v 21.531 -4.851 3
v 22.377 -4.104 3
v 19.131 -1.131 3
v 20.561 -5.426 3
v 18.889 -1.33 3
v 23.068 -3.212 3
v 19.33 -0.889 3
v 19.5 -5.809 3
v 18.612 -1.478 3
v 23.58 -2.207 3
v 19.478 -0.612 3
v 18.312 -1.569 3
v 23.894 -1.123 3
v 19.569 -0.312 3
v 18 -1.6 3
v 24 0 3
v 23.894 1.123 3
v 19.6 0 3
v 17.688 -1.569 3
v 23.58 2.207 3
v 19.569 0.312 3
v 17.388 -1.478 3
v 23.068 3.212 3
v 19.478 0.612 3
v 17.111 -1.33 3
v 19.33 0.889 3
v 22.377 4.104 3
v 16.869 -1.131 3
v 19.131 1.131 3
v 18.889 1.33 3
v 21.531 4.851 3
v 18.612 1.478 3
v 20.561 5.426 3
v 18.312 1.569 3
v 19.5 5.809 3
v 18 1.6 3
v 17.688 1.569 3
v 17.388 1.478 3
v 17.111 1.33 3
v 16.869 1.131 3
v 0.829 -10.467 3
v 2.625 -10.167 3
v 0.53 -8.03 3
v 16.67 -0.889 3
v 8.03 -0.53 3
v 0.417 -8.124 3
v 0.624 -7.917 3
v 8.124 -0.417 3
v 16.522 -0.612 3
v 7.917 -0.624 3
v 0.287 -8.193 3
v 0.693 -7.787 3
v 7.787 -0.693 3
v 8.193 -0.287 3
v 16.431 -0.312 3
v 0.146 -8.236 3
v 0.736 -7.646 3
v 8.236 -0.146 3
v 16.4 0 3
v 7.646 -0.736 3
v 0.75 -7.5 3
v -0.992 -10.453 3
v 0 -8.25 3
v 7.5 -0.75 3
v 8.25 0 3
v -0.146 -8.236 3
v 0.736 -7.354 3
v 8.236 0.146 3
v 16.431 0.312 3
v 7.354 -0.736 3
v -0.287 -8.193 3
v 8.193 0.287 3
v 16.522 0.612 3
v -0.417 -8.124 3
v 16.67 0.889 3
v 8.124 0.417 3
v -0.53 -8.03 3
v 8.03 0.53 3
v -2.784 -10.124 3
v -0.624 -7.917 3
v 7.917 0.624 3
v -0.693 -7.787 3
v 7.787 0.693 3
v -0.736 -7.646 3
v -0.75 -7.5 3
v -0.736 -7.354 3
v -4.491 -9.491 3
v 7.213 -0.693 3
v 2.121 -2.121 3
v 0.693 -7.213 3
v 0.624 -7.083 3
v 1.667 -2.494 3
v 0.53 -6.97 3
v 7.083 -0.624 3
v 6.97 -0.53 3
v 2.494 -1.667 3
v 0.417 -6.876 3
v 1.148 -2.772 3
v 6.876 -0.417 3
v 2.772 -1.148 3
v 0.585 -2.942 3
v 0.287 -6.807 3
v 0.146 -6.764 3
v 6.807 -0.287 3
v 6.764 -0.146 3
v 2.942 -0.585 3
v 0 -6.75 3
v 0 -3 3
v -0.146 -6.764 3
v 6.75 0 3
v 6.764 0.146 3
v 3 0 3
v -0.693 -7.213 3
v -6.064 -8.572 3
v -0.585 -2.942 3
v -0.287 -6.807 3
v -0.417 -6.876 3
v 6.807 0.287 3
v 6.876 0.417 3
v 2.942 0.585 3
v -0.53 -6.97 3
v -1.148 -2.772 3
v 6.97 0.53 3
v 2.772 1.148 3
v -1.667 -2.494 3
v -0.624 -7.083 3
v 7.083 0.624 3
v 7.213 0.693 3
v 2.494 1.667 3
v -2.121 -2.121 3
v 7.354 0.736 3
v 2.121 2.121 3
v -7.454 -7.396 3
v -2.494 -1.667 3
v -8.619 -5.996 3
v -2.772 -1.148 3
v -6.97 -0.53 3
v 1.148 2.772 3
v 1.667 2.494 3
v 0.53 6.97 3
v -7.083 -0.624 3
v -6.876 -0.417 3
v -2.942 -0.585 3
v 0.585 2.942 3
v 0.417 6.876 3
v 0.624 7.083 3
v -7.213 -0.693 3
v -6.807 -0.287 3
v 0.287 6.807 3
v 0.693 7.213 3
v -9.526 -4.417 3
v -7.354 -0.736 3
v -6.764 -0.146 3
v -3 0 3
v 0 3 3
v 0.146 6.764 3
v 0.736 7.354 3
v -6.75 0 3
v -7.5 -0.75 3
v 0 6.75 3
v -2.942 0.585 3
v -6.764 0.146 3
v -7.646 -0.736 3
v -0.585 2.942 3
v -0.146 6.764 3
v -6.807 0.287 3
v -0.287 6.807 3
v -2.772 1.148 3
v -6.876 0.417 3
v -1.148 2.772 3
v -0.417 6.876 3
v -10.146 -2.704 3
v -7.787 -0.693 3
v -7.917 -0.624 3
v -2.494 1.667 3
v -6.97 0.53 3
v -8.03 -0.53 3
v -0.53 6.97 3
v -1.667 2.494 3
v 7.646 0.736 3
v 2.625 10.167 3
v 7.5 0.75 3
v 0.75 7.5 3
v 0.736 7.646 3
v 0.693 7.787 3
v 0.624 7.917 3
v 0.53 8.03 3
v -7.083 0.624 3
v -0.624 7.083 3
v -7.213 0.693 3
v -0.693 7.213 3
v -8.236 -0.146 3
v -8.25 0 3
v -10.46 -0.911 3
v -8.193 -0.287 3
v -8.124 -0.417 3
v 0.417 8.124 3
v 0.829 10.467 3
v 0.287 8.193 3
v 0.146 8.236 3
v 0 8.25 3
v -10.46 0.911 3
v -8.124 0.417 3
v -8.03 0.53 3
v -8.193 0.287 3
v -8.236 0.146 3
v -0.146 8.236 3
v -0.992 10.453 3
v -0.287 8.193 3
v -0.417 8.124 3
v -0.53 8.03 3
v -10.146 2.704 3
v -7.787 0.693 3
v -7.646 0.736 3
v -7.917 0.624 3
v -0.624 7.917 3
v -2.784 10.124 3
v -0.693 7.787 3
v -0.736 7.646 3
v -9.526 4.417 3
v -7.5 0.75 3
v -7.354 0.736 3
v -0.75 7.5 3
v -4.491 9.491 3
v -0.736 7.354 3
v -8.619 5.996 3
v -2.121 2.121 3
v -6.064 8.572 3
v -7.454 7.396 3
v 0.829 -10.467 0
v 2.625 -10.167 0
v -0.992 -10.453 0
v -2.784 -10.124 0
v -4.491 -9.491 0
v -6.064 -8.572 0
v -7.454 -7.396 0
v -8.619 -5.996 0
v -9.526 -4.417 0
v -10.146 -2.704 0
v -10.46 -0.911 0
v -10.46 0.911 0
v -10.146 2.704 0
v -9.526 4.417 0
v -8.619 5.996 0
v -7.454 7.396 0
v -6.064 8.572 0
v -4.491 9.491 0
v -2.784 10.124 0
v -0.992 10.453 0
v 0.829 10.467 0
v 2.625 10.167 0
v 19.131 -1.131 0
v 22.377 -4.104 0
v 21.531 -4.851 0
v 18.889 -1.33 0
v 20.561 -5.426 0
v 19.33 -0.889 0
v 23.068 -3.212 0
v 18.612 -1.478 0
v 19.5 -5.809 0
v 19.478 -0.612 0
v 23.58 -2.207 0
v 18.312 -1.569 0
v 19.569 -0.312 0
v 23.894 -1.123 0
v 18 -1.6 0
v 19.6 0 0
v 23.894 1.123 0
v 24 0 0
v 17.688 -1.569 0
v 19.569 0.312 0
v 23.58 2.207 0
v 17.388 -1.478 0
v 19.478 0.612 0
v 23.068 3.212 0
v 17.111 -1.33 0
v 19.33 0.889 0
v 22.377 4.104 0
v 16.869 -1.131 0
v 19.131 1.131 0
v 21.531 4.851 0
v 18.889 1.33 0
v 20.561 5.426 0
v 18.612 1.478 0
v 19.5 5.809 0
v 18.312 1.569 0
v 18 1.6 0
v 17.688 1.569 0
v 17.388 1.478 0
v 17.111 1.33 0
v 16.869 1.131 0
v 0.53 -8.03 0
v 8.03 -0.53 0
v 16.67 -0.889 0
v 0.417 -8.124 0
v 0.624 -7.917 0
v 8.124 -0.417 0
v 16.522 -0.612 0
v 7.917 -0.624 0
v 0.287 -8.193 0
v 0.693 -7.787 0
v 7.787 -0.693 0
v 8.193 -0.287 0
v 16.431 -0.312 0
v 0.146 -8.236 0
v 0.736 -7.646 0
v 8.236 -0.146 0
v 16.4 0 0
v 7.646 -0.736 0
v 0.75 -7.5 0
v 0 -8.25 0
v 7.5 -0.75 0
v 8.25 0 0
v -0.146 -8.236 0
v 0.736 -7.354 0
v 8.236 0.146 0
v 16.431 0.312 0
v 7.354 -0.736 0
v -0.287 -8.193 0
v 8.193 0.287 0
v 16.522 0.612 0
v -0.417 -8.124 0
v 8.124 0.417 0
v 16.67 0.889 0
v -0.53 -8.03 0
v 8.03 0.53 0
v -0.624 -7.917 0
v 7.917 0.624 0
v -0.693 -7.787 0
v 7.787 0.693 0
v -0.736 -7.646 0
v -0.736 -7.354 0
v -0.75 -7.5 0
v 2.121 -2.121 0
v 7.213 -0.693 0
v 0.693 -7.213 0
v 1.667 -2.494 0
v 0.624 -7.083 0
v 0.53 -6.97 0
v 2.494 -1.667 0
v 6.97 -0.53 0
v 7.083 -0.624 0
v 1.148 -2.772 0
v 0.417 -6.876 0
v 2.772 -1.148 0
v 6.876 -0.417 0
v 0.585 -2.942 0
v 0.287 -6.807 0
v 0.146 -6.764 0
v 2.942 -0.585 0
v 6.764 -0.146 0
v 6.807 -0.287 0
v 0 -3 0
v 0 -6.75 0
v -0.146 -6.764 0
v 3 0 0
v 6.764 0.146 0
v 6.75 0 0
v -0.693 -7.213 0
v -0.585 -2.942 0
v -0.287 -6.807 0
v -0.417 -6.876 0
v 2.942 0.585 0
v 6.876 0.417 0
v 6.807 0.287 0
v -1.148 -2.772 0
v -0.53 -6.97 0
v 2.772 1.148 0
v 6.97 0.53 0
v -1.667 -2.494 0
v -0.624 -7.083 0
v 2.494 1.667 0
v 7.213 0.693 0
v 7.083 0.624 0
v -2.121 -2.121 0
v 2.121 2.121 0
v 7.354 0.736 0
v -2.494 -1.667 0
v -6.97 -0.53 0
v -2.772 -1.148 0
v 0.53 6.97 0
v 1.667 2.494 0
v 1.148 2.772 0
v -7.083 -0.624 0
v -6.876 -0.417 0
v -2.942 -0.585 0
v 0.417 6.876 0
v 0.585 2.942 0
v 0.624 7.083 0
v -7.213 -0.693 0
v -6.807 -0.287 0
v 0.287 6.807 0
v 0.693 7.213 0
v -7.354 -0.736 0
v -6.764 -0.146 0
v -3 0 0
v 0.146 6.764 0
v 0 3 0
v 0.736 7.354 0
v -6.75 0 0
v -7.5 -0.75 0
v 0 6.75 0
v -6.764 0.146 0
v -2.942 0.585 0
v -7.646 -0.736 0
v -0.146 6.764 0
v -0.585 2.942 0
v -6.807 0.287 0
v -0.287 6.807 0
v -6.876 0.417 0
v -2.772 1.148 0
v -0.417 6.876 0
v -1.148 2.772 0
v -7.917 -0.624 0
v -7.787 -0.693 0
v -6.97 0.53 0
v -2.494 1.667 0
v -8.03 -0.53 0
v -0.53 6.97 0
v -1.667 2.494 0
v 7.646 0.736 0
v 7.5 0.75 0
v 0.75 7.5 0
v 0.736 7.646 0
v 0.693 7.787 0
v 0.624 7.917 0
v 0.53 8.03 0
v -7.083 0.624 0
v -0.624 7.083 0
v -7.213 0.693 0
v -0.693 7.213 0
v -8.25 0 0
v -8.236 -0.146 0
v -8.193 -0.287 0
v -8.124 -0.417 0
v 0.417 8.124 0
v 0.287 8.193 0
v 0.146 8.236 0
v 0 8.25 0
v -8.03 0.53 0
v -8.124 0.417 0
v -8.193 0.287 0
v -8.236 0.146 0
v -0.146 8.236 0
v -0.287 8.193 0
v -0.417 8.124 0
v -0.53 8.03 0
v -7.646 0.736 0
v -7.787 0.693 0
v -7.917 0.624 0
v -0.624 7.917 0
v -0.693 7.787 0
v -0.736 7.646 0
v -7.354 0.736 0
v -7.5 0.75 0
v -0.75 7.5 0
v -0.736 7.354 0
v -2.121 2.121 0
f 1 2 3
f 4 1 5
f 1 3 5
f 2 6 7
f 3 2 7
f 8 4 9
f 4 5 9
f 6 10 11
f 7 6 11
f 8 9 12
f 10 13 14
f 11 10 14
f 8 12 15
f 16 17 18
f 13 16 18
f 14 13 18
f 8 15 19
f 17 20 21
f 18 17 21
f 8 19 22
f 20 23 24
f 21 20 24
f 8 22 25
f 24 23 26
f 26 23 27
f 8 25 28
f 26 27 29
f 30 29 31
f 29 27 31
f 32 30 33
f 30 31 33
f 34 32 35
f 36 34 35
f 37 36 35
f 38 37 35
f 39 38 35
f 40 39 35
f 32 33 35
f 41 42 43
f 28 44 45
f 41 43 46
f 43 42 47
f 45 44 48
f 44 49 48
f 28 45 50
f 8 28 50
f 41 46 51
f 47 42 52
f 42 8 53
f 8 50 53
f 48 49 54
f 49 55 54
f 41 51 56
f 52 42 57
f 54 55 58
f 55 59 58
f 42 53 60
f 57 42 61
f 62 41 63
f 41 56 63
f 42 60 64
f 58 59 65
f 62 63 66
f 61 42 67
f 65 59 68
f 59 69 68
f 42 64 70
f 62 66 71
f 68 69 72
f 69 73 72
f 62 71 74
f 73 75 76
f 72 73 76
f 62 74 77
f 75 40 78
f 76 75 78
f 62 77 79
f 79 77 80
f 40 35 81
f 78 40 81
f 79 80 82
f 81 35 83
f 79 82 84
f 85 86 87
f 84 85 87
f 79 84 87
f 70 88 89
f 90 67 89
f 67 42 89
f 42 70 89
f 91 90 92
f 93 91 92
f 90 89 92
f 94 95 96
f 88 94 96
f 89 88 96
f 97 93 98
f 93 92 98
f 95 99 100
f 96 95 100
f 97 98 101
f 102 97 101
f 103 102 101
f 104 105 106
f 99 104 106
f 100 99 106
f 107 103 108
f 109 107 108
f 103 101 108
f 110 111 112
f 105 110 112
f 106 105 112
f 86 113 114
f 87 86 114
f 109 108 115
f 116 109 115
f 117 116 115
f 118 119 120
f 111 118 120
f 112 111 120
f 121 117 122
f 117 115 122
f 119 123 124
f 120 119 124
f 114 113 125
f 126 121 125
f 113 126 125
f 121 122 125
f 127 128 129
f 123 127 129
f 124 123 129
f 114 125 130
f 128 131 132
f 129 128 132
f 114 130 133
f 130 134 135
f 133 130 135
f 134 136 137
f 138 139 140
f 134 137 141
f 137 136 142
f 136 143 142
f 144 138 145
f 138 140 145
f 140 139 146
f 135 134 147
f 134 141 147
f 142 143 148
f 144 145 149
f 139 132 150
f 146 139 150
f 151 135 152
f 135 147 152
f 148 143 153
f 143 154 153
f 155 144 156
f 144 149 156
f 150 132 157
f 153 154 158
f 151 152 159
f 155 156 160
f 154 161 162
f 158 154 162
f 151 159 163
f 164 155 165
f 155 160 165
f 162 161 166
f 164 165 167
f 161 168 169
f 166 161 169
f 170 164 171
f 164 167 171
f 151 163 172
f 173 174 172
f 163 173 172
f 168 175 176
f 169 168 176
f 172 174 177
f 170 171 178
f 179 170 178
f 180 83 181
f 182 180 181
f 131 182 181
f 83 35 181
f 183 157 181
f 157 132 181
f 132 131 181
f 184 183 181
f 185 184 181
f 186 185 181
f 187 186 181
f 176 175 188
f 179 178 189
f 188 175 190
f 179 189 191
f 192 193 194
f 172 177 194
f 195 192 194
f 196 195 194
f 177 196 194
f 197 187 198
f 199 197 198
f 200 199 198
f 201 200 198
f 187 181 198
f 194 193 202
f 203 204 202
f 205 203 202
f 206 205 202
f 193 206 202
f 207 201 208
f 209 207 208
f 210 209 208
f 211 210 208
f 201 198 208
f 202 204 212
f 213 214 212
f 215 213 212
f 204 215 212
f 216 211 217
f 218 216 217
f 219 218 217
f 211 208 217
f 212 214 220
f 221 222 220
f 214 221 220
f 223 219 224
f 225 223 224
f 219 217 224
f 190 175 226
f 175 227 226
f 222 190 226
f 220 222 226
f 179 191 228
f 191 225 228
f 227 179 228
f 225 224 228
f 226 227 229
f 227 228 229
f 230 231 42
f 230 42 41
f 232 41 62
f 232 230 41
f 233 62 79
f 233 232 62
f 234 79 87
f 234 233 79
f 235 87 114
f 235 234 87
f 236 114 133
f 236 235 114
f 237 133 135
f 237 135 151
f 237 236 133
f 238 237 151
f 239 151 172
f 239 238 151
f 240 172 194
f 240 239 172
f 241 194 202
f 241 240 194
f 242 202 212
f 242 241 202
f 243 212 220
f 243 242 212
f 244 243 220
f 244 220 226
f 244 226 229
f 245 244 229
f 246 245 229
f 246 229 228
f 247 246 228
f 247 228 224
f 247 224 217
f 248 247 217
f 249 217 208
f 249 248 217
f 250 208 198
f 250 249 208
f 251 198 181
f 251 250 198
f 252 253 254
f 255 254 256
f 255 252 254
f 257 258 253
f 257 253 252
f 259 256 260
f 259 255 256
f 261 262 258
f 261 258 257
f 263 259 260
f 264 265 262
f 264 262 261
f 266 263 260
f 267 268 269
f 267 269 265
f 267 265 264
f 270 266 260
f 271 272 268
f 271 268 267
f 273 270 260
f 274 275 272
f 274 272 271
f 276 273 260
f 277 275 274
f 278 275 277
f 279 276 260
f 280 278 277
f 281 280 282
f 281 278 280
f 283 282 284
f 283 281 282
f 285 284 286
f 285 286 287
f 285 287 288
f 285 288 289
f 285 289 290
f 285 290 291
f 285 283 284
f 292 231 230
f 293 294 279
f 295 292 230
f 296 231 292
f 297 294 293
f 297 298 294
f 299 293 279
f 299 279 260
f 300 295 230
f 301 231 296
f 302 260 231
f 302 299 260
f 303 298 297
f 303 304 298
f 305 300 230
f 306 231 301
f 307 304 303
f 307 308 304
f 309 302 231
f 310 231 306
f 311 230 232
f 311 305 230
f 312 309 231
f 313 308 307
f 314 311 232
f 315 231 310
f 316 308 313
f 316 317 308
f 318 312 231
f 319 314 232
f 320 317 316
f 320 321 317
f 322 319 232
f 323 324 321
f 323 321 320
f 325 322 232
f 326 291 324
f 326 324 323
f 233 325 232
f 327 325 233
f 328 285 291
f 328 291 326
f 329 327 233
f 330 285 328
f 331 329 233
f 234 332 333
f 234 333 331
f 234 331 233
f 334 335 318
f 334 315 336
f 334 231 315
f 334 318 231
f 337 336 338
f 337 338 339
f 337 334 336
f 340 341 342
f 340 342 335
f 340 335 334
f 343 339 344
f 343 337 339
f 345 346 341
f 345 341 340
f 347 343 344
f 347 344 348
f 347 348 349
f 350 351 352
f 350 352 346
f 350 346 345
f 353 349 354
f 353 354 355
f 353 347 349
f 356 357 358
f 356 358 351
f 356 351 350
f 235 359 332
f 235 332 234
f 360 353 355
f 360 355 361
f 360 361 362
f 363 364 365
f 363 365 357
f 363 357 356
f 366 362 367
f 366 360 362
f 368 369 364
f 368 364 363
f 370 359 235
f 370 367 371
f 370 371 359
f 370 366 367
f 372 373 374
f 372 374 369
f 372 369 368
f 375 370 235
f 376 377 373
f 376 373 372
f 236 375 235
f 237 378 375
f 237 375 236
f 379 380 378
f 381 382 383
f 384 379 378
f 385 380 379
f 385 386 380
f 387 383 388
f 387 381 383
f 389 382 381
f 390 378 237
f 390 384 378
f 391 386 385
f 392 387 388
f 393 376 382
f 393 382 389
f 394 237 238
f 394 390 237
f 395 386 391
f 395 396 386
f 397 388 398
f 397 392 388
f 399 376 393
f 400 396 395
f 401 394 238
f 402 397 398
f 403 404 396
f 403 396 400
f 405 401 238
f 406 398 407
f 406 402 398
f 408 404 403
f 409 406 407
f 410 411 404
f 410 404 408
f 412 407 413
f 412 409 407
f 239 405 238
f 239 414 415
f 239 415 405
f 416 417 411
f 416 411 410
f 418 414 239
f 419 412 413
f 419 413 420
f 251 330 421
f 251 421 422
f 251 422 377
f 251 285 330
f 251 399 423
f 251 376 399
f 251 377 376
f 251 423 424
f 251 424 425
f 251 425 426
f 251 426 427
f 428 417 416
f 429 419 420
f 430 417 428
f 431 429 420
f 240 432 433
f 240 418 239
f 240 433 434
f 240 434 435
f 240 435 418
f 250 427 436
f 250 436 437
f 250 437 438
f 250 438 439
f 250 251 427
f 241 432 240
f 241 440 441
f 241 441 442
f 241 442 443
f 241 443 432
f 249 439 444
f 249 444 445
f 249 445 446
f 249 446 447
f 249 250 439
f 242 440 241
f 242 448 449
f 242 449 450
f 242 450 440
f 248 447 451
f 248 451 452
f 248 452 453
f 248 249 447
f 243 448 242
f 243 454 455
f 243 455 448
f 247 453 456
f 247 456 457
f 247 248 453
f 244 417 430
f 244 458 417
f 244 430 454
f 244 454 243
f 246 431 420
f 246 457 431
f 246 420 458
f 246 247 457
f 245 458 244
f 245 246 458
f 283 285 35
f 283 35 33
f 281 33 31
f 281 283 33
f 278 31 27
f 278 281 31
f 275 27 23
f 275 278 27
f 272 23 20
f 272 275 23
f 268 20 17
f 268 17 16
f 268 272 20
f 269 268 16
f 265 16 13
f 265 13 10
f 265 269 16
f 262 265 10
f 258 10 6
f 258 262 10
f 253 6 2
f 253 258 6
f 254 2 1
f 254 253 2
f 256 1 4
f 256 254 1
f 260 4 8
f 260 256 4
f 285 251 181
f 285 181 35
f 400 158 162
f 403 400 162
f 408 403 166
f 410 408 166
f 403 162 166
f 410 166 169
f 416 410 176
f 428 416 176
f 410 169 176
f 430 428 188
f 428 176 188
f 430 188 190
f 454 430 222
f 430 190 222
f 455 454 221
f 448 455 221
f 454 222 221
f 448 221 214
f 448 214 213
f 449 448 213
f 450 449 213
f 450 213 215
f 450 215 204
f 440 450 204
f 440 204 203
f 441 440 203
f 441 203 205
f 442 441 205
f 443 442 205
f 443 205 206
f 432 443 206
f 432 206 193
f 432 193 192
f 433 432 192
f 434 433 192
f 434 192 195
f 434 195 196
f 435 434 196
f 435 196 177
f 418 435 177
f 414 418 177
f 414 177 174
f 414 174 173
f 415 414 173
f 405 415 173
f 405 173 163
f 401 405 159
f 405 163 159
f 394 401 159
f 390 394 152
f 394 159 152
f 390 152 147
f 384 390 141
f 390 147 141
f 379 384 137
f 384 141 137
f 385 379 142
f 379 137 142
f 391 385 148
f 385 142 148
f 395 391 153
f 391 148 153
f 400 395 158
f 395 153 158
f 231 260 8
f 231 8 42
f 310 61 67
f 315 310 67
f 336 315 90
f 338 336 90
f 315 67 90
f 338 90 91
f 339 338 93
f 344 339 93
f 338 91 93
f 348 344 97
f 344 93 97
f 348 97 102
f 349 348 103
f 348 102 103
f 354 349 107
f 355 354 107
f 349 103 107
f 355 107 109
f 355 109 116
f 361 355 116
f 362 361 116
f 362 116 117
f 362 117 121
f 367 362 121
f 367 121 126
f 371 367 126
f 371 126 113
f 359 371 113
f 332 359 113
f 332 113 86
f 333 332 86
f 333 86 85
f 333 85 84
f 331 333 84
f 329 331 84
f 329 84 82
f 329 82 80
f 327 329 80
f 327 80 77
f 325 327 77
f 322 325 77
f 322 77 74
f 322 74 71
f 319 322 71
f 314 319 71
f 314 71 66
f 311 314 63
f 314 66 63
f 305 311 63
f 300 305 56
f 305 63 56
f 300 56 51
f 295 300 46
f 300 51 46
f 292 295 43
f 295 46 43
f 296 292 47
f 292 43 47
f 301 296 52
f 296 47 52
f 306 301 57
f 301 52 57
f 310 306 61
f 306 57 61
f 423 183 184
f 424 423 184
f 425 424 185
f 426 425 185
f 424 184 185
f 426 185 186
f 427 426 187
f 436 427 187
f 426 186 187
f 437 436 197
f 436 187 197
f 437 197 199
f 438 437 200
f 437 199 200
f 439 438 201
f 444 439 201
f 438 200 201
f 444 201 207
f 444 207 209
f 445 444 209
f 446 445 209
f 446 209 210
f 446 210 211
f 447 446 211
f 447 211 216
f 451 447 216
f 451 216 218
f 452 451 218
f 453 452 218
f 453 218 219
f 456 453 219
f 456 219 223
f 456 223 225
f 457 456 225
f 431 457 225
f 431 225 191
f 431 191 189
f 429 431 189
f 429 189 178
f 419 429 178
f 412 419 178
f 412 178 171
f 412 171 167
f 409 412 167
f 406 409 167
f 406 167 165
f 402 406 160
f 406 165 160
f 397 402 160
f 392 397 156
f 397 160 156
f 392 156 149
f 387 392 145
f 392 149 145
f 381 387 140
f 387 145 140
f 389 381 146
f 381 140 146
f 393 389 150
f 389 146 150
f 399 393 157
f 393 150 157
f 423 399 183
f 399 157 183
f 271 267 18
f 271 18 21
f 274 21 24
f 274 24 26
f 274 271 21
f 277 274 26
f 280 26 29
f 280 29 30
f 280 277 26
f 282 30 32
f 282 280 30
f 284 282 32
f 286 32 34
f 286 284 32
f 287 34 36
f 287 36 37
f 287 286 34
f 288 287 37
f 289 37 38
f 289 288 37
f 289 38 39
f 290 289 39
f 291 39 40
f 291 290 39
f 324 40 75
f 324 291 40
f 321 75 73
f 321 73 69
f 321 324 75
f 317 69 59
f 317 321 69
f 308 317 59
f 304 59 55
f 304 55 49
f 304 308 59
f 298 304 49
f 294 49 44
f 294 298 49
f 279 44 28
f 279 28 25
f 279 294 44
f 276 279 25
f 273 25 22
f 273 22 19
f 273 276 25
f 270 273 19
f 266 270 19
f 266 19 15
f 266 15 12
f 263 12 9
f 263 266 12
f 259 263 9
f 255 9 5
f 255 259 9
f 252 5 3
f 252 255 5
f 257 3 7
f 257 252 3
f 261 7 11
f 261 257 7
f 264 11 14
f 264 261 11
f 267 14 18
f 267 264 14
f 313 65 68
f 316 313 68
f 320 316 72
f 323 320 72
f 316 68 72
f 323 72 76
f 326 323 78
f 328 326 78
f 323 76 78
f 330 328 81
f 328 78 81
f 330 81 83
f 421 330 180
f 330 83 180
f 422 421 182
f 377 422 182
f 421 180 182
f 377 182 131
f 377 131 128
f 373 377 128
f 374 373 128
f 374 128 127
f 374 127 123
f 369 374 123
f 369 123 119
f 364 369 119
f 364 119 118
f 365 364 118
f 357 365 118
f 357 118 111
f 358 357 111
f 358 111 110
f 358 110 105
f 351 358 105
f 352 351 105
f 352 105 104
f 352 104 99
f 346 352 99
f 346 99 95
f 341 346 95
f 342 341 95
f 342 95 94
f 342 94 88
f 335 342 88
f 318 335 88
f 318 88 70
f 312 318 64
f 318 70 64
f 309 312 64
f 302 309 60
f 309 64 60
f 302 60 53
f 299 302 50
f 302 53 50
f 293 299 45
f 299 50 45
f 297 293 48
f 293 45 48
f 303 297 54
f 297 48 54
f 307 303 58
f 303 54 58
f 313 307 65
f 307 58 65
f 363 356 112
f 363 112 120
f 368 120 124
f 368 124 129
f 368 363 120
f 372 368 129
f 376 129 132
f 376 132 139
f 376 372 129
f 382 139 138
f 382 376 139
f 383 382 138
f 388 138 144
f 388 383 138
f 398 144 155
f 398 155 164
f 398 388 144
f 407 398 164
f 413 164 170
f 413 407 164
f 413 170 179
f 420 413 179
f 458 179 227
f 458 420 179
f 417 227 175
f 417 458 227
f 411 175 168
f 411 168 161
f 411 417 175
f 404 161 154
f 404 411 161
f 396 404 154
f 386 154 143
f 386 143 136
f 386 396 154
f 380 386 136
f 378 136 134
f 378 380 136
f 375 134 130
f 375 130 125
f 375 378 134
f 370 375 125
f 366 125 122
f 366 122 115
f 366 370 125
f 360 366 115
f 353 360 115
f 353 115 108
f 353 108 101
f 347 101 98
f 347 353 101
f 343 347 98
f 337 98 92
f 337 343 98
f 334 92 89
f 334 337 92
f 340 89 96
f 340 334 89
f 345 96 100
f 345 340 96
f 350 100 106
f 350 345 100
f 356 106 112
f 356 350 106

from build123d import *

# Parameters (mm, degrees)
SKETCH_1_R          = 1.6
SKETCH_1_R_2        = 3
EXTRUDE_1_DEPTH     = 3
CUT_EXTRUDE_1_REACH = 5
SKETCH_2_R          = 0.75


with BuildPart() as part:
    # 草图1 → 凸台-拉伸1 (new body)
    with BuildSketch(Plane.XY):
        with BuildLine():
            Line((2.625, 10.166581284), (19.5, 5.809475019))
            ThreePointArc((19.5, 5.809475019), (24, 0), (19.5, -5.809475019))
            Line((19.5, -5.809475019), (2.625, -10.166581284))
            ThreePointArc((2.625, -10.166581284), (-10.5, 0), (2.625, 10.166581284))
        make_face()
        with Locations((18, 0)):
            Circle(SKETCH_1_R, mode=Mode.SUBTRACT)
        Circle(SKETCH_1_R_2, mode=Mode.SUBTRACT)
    extrude(amount=EXTRUDE_1_DEPTH)

    # 草图2 → 切除-拉伸1 (cut, up to next)
    with BuildSketch(Plane.XY.offset(3), mode=Mode.PRIVATE) as cut_extrude_1_sk1:
        with Locations((0, 7.5)):
            Circle(SKETCH_2_R)
    cut_extrude_1_tool1 = extrude(cut_extrude_1_sk1.sketch, amount=-CUT_EXTRUDE_1_REACH, mode=Mode.PRIVATE) & part.part
    add(cut_extrude_1_tool1.solids().sort_by_distance((0, 7.5, 3))[0], mode=Mode.SUBTRACT)
    # 草图2 → 切除-拉伸1 (cut, up to next)
    with BuildSketch(Plane.XY.offset(3), mode=Mode.PRIVATE) as cut_extrude_1_sk2:
        with Locations((7.5, 0)):
            Circle(SKETCH_2_R)
    cut_extrude_1_tool2 = extrude(cut_extrude_1_sk2.sketch, amount=-CUT_EXTRUDE_1_REACH, mode=Mode.PRIVATE) & part.part
    add(cut_extrude_1_tool2.solids().sort_by_distance((7.5, 0, 3))[0], mode=Mode.SUBTRACT)
    # 草图2 → 切除-拉伸1 (cut, up to next)
    with BuildSketch(Plane.XY.offset(3), mode=Mode.PRIVATE) as cut_extrude_1_sk3:
        with Locations((0, -7.5)):
            Circle(SKETCH_2_R)
    cut_extrude_1_tool3 = extrude(cut_extrude_1_sk3.sketch, amount=-CUT_EXTRUDE_1_REACH, mode=Mode.PRIVATE) & part.part
    add(cut_extrude_1_tool3.solids().sort_by_distance((0, -7.5, 3))[0], mode=Mode.SUBTRACT)
    # 草图2 → 切除-拉伸1 (cut, up to next)
    with BuildSketch(Plane.XY.offset(3), mode=Mode.PRIVATE) as cut_extrude_1_sk4:
        with Locations((-7.5, 0)):
            Circle(SKETCH_2_R)
    cut_extrude_1_tool4 = extrude(cut_extrude_1_sk4.sketch, amount=-CUT_EXTRUDE_1_REACH, mode=Mode.PRIVATE) & part.part
    add(cut_extrude_1_tool4.solids().sort_by_distance((-7.5, 0, 3))[0], mode=Mode.SUBTRACT)


solid = part.part
